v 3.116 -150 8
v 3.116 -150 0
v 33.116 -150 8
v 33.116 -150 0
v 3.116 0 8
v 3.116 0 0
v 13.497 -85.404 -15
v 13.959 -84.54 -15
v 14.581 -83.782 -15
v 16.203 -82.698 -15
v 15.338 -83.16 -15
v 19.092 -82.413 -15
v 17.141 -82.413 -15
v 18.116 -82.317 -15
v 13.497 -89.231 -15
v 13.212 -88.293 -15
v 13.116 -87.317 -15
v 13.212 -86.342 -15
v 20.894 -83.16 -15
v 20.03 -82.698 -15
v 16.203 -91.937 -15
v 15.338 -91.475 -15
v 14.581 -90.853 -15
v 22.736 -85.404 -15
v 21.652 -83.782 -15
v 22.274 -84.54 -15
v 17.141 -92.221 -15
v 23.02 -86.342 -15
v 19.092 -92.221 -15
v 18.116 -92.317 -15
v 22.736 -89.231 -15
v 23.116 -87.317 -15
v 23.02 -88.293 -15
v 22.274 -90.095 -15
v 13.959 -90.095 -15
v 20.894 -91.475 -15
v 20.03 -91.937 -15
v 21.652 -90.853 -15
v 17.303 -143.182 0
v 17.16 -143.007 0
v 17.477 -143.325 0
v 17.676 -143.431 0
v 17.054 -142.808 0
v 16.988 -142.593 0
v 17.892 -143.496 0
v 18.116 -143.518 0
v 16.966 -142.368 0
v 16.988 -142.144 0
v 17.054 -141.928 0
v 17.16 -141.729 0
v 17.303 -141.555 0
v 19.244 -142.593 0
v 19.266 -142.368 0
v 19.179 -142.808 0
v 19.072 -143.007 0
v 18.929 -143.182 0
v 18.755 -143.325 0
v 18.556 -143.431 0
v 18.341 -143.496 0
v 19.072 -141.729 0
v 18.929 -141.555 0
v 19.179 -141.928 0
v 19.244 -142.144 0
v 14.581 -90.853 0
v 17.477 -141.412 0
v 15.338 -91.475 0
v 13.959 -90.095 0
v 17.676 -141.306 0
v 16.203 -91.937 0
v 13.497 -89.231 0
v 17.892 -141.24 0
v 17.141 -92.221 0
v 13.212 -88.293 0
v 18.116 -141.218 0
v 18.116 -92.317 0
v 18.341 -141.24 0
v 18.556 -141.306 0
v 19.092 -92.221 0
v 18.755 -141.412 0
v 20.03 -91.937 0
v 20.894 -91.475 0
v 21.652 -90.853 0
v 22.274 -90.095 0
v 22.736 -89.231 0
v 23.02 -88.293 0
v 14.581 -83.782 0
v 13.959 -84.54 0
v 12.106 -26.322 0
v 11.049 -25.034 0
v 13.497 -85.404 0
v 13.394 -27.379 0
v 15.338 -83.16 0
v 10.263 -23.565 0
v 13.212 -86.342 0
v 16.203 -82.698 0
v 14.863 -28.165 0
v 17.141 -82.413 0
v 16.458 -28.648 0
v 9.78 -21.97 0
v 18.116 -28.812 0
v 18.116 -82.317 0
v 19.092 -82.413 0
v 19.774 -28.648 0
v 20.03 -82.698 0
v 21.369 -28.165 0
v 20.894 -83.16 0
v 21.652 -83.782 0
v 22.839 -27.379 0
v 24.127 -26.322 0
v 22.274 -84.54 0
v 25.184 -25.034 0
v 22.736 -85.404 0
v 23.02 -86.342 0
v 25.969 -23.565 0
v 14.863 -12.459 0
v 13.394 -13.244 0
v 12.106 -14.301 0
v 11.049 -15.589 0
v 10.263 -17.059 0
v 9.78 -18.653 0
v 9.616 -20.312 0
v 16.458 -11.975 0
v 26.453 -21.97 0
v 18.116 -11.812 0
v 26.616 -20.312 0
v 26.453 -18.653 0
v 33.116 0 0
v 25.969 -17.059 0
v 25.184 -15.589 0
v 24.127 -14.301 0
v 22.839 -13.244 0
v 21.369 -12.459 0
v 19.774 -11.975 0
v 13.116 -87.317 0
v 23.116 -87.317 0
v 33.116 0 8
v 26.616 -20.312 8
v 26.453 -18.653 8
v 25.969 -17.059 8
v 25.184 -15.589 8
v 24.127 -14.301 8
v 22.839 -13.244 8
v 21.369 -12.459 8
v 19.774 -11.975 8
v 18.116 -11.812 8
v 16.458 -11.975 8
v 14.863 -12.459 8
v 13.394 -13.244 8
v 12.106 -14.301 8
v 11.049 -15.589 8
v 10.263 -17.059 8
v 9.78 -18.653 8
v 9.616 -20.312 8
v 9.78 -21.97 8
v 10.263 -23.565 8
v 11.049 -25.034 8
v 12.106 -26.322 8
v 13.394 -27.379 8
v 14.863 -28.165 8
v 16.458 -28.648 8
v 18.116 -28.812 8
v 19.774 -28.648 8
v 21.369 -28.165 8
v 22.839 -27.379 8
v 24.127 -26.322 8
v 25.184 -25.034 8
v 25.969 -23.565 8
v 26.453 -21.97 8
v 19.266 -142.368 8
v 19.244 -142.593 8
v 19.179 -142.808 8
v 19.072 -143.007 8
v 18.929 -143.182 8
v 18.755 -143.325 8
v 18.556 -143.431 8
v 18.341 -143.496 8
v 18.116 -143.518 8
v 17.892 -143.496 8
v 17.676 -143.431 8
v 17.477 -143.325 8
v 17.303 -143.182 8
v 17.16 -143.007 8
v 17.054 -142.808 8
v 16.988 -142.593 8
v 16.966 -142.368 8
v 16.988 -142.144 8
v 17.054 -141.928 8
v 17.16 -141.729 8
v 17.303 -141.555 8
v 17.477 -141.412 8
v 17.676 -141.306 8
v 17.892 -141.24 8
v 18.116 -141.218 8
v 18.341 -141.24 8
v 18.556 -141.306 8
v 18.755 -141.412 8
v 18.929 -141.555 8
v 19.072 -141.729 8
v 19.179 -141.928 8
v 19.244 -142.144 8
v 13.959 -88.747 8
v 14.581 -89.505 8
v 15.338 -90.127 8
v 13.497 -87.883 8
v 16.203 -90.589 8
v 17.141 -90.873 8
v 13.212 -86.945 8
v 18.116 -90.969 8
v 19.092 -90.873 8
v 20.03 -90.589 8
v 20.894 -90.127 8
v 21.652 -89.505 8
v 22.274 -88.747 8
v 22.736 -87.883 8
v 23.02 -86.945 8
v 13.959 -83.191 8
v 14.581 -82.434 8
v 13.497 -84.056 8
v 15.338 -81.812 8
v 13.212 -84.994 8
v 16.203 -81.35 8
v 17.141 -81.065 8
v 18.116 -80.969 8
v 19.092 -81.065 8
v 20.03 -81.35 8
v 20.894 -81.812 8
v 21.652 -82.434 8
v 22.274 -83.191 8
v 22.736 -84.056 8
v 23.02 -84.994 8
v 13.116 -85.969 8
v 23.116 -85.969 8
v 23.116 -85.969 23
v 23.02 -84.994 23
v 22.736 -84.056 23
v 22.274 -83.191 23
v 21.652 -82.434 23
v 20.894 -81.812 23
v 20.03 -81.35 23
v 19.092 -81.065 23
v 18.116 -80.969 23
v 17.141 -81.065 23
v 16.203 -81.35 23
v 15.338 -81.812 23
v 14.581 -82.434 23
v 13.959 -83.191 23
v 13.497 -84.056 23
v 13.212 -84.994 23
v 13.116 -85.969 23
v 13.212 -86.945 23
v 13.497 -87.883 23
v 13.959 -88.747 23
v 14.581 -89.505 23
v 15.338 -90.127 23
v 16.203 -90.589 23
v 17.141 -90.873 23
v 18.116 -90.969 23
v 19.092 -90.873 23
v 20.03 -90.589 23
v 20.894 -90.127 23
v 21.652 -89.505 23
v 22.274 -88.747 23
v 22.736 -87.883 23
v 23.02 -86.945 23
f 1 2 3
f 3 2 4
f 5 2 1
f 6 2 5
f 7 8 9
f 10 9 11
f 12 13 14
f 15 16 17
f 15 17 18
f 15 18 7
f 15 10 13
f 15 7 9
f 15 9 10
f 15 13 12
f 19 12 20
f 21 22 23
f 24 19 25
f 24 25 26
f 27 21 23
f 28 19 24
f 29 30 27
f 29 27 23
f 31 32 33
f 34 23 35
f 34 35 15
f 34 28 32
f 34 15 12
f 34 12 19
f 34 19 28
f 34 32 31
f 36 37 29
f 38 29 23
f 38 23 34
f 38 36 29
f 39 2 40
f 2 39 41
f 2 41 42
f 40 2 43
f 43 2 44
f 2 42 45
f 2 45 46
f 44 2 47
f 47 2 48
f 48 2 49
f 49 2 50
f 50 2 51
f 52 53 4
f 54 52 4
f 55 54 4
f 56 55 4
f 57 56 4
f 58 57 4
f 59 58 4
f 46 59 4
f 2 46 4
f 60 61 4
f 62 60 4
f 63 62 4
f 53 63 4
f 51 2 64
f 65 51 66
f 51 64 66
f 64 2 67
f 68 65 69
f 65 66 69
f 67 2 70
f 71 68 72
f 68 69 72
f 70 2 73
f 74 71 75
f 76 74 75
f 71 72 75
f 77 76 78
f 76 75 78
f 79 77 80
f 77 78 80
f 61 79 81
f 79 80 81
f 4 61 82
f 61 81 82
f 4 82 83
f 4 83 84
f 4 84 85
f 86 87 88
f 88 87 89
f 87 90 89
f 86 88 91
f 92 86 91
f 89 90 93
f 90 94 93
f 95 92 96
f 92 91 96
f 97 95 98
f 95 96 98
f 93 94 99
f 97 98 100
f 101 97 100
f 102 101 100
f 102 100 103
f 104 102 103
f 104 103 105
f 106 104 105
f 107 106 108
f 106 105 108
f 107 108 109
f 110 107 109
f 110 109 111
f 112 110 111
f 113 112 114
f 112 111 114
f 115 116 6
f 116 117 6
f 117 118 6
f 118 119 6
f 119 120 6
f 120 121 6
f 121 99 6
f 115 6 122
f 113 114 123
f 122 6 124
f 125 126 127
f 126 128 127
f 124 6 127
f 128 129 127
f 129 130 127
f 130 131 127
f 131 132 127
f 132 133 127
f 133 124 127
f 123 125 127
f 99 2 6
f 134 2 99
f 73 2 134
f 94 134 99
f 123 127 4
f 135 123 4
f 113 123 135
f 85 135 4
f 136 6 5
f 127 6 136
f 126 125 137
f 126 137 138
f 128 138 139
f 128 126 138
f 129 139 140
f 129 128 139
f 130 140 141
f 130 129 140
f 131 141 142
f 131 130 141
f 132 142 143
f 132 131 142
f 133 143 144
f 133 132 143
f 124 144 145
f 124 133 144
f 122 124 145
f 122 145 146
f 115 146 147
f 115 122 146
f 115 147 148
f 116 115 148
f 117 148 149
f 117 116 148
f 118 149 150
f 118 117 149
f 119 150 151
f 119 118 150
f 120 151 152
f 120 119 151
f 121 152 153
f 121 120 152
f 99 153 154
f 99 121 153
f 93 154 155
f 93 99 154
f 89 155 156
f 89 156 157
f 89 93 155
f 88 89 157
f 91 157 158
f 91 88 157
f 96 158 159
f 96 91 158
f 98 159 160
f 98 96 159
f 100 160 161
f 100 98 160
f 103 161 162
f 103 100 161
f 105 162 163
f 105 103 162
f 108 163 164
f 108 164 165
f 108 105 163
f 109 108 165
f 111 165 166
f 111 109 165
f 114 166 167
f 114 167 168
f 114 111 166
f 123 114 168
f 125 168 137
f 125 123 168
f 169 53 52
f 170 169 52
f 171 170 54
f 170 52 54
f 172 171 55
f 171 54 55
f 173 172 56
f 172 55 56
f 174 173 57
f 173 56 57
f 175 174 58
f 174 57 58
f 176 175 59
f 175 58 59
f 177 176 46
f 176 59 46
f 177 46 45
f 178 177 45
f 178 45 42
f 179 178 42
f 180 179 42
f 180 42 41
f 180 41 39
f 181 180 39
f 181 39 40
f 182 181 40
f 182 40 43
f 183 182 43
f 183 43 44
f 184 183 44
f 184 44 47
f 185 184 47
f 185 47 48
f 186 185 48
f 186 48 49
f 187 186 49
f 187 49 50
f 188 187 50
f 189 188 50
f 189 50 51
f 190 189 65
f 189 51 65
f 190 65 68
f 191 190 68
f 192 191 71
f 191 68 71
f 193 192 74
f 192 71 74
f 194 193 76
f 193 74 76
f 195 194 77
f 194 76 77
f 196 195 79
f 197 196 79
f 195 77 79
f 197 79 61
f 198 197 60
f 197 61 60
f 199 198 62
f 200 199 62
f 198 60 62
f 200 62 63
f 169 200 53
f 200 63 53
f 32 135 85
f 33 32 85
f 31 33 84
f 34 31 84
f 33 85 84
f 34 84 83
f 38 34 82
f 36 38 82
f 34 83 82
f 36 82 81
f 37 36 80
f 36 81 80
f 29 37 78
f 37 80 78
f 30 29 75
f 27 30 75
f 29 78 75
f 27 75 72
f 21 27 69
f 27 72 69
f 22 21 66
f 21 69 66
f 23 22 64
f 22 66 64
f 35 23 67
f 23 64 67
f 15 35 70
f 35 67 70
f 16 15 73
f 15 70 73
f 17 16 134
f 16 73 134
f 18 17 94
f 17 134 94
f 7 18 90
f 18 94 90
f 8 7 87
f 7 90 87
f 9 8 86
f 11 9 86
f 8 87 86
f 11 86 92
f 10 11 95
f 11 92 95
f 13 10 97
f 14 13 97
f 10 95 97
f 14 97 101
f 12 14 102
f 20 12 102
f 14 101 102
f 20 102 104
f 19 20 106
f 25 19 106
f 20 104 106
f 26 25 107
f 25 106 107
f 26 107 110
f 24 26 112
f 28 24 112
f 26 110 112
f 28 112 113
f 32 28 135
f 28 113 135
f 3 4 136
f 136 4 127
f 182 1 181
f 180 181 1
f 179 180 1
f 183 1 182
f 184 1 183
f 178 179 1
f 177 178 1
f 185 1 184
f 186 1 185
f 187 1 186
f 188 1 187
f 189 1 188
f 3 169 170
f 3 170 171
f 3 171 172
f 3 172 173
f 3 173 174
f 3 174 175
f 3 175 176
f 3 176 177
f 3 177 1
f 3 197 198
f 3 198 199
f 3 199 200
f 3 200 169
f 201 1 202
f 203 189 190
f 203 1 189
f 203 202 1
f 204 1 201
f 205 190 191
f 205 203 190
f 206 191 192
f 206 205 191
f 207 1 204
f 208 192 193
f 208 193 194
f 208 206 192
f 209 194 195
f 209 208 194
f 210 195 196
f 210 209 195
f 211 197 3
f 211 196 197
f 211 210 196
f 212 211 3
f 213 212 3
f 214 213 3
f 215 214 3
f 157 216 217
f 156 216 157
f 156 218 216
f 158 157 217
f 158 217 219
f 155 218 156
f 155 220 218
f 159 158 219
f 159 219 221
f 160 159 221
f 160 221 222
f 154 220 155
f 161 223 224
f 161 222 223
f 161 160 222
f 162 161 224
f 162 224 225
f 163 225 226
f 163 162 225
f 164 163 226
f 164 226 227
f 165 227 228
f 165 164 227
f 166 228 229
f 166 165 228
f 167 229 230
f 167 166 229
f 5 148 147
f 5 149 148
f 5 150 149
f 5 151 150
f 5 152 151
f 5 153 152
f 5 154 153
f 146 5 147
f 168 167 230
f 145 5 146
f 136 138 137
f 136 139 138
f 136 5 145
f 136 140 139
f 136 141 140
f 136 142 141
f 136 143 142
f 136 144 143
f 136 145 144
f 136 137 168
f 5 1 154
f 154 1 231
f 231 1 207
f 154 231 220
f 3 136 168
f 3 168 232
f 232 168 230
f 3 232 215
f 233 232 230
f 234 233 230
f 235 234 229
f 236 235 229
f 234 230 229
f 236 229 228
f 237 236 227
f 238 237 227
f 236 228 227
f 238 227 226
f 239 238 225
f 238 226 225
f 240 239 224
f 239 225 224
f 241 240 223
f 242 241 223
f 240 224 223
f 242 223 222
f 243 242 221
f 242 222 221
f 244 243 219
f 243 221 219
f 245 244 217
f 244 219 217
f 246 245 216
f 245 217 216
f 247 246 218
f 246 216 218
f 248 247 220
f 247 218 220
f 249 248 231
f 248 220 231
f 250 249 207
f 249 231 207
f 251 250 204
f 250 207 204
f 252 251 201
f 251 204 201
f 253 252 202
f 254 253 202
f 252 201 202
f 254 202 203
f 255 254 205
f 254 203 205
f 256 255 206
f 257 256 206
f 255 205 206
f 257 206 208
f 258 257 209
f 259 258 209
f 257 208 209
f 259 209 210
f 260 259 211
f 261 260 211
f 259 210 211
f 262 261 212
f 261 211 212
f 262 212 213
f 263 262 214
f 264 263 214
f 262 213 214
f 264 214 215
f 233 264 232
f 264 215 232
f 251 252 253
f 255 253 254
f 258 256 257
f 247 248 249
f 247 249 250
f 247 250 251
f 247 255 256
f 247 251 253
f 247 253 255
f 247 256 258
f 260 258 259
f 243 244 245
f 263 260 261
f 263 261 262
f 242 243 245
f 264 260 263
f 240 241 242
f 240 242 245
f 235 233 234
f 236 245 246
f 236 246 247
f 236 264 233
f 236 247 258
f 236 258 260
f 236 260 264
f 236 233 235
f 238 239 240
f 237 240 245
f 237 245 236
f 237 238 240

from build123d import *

# Parameters (mm, degrees)
F0_W     = 30
F0_H     = 150
F0_R     = 8.5
F1_DEPTH = 8
F2_R     = 5
F3_DEPTH = 15
F4_R     = 5
F5_DEPTH = 15
F6_R     = 1.15
F7_DEPTH = 25


with BuildPart() as f1:
    # F0 (on Top) → F1 (new body)
    with BuildSketch(Plane.XY):
        with Locations((18.116215, -75)):
            Rectangle(F0_W, F0_H)
        with Locations((18.116215, -20.311708)):
            Circle(F0_R, mode=Mode.SUBTRACT)
    extrude(amount=F1_DEPTH)

    # F2 (on face) → F3 (join)
    with BuildSketch(Plane.XY.offset(8)):
        with Locations((18.116215, -85.969344)):
            Circle(F2_R)
    extrude(amount=F3_DEPTH)

    # F4 (on face) → F5 (join)
    with BuildSketch(Plane(origin=(0, 0, 0), x_dir=(1, 0, 0), z_dir=(0, 0, -1))):
        with Locations((18.116215, 87.31737)):
            Circle(F4_R)
    extrude(amount=F5_DEPTH)

    # F6 (on face) → F7 (cut)
    with BuildSketch(Plane(origin=(0, 0, 0), x_dir=(1, 0, 0), z_dir=(0, 0, -1))):
        with Locations((18.116215, 142.368332)):
            Circle(F6_R)
    extrude(amount=-F7_DEPTH, mode=Mode.SUBTRACT)


solid = f1.part
